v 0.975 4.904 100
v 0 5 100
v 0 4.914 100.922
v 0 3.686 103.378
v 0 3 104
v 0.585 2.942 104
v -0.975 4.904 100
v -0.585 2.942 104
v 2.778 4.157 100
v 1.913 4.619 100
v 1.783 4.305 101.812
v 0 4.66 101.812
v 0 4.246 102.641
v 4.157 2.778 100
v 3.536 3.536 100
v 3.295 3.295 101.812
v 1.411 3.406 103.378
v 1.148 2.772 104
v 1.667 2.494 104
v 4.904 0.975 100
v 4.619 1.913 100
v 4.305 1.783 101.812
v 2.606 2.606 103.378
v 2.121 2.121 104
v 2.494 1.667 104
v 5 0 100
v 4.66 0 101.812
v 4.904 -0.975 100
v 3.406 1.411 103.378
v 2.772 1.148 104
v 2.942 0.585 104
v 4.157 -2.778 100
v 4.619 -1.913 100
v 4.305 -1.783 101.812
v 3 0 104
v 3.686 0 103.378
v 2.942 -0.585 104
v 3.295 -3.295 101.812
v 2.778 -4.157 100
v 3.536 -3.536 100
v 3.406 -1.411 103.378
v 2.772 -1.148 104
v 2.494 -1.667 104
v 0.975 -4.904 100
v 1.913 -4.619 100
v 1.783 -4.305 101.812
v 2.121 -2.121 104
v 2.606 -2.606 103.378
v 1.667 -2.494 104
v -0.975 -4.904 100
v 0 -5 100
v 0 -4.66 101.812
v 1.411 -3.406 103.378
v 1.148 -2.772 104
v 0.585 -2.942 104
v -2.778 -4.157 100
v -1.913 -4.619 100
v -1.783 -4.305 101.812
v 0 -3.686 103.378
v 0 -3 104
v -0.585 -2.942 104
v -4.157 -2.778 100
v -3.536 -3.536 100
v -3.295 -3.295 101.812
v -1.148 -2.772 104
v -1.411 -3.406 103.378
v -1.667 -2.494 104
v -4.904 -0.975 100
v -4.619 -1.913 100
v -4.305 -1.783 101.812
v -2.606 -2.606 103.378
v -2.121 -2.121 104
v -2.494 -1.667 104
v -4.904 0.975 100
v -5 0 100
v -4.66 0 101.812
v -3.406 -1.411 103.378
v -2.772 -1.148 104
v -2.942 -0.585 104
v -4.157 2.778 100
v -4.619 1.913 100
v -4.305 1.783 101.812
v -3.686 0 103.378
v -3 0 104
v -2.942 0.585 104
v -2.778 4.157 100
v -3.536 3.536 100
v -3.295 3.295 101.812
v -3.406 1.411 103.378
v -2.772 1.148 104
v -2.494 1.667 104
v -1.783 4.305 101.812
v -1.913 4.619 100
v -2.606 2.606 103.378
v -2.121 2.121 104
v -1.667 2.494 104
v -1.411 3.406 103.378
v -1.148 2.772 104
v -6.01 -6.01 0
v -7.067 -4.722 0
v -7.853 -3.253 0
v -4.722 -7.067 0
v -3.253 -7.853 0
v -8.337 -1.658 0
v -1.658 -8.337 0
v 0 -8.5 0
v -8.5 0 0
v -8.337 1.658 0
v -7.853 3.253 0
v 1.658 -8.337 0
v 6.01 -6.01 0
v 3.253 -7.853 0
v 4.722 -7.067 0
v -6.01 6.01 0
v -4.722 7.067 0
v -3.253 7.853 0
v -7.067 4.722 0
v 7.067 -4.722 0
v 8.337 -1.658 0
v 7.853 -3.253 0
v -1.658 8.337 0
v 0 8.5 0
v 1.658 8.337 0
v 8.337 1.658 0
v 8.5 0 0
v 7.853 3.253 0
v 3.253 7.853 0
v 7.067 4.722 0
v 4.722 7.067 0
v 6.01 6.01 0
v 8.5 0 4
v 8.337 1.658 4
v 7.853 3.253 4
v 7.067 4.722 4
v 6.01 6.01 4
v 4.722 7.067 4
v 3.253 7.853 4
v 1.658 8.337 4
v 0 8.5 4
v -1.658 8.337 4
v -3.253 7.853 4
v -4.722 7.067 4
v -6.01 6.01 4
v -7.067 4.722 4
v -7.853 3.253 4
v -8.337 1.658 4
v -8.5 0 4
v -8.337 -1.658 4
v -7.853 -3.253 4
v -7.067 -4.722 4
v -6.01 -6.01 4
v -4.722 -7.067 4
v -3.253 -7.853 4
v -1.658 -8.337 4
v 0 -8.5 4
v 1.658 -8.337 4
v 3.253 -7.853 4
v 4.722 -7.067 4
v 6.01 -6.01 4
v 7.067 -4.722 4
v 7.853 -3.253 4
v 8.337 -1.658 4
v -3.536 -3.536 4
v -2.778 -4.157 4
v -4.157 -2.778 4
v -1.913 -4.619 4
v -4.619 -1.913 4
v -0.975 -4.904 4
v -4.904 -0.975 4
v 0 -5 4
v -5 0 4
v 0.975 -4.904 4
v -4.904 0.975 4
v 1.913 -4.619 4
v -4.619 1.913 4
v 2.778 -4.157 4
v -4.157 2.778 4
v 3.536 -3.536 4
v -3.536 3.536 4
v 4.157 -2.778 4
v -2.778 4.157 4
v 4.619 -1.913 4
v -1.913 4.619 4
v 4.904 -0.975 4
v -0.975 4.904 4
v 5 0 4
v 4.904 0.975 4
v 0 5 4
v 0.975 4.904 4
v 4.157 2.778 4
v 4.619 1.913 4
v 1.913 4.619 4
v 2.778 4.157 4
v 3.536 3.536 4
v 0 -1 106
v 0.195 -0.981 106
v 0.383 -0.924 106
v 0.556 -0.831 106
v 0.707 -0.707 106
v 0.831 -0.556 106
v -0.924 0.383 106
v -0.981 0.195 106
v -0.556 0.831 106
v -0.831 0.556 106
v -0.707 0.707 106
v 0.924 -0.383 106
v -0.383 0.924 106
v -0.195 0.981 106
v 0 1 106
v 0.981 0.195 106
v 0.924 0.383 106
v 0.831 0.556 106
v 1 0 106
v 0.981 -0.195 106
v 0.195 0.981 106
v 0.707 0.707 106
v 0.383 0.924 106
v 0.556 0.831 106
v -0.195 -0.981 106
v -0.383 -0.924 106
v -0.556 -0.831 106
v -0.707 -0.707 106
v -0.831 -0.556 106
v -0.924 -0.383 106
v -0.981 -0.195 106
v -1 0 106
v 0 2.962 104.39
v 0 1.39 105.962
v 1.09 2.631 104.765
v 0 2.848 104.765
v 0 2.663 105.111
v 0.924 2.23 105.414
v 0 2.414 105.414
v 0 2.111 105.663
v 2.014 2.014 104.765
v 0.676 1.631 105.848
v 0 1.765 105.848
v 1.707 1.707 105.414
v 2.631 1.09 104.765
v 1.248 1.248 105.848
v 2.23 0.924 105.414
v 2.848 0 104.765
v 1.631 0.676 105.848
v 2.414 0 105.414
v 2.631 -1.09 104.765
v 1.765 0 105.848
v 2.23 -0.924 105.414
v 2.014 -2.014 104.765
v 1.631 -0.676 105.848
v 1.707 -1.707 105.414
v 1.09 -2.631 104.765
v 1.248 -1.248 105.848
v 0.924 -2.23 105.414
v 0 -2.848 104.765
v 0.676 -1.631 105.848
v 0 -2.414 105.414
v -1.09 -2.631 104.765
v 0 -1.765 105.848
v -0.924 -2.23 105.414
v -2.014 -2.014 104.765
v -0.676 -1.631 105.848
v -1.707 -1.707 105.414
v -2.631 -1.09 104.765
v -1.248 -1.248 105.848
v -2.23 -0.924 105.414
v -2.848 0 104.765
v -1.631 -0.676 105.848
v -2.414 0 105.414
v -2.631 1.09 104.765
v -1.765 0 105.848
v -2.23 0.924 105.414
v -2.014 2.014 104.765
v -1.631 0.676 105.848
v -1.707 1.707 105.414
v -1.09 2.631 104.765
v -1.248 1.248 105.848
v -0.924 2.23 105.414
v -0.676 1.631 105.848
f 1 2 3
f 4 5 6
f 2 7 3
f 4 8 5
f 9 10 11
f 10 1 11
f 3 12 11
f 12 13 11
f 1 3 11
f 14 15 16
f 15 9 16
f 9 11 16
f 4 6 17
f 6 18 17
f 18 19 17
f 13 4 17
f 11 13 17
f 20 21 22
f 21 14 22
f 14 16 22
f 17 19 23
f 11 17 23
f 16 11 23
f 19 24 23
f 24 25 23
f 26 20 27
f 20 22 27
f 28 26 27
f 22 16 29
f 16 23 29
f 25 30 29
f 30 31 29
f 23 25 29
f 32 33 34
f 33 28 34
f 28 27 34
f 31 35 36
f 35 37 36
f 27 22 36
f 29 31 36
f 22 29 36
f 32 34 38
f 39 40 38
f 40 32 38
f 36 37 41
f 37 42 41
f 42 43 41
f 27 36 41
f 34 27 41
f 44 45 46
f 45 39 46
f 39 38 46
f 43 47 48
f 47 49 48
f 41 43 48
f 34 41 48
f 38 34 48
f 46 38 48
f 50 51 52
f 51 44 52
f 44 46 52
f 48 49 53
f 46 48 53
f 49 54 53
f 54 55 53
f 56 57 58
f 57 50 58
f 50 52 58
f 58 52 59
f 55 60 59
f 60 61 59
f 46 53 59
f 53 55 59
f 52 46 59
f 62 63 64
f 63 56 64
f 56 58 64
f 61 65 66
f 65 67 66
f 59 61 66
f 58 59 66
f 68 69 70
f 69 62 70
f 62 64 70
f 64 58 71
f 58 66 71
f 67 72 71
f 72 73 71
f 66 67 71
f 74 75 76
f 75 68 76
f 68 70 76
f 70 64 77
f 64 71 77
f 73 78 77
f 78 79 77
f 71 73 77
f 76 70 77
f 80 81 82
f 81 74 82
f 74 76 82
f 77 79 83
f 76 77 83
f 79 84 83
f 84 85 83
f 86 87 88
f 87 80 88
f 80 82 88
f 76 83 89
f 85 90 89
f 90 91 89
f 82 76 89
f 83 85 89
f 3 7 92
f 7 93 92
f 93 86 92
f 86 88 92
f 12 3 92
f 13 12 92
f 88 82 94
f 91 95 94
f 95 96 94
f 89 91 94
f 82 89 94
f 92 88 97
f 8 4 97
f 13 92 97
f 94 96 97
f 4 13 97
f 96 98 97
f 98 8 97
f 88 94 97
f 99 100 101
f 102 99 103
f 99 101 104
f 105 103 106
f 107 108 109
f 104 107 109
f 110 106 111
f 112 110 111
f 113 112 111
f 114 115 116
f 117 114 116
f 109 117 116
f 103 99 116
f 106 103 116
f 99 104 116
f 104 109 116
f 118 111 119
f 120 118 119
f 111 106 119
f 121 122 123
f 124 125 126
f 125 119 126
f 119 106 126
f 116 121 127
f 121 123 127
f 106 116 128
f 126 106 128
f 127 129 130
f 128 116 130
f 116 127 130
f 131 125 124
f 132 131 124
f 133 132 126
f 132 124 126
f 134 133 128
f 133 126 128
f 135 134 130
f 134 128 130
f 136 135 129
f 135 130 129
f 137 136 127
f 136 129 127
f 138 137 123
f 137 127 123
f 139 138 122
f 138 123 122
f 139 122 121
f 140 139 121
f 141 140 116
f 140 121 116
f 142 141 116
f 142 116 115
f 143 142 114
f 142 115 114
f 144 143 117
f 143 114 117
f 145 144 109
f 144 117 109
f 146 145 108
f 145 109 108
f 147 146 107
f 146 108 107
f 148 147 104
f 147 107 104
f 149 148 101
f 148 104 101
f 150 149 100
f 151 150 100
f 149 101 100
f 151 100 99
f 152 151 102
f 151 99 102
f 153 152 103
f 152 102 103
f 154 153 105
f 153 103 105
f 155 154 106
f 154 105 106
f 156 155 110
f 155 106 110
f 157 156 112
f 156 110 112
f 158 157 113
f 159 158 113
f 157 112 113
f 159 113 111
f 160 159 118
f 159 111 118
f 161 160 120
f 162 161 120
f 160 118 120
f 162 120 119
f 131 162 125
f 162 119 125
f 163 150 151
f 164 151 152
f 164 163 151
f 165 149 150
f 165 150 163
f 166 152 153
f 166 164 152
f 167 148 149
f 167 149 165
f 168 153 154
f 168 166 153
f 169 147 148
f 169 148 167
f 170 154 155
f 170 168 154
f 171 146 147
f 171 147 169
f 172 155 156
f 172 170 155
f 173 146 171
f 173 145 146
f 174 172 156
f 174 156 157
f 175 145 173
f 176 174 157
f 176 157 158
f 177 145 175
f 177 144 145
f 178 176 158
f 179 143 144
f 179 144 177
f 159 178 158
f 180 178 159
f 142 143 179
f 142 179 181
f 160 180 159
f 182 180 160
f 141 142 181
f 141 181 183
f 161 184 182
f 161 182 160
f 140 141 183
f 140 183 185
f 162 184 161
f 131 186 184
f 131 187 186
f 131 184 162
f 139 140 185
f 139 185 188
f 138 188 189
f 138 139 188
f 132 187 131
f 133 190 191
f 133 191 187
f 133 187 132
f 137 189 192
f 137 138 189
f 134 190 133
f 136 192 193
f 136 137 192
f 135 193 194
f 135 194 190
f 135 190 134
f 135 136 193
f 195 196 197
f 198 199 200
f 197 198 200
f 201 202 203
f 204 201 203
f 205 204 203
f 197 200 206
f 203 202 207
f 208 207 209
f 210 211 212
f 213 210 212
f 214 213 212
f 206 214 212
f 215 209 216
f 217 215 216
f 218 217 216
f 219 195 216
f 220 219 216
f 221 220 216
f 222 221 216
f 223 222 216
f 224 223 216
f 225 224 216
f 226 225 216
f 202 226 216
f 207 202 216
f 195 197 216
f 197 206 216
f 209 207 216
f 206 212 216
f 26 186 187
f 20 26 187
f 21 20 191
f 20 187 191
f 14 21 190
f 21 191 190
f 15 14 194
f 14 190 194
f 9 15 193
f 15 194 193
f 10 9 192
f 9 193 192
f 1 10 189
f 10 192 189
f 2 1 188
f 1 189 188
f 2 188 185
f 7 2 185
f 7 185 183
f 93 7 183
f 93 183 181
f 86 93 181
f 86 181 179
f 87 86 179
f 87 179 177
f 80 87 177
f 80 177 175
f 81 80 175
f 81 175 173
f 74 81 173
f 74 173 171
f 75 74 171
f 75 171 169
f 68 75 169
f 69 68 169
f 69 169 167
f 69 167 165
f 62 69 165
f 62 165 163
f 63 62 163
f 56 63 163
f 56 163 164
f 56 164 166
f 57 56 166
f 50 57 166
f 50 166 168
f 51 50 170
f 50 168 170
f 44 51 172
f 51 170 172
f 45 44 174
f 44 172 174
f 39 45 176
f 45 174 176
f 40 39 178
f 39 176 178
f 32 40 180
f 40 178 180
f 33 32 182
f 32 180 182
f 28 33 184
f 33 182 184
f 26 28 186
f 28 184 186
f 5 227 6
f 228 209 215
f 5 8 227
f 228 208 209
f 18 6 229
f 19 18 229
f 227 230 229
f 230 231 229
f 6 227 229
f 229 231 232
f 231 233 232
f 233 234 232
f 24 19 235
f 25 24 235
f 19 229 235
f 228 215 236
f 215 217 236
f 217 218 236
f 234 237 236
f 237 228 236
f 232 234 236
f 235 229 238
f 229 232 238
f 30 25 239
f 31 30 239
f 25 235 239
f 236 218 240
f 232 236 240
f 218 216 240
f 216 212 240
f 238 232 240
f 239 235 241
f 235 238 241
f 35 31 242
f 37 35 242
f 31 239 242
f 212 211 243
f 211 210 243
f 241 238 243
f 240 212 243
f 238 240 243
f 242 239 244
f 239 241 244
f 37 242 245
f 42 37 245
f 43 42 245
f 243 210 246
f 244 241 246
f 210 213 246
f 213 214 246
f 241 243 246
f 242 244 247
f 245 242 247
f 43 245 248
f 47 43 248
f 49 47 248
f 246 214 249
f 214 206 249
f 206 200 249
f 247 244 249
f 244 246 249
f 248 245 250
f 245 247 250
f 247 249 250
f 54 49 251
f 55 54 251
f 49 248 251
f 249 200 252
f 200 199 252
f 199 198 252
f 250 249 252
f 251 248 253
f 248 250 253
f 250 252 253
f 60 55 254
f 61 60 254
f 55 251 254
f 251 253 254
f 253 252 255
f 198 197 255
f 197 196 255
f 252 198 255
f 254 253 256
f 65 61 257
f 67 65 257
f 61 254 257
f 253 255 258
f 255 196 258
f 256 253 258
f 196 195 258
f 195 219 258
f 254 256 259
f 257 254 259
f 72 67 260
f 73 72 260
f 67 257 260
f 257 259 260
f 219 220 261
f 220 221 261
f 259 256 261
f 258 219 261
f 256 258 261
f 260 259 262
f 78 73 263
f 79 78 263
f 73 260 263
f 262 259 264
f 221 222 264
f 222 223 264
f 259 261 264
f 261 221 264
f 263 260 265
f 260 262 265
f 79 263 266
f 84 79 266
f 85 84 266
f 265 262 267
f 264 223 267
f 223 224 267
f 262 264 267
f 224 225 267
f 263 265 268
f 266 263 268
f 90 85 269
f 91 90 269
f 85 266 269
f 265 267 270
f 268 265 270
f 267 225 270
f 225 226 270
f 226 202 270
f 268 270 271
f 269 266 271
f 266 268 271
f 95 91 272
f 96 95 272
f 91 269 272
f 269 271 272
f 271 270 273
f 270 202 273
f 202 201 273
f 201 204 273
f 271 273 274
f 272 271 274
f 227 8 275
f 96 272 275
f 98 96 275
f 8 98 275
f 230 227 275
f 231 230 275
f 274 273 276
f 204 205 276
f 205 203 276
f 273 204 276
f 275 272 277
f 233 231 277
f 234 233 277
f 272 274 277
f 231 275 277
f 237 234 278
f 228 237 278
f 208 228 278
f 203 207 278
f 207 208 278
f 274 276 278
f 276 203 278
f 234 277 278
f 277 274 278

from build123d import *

# Parameters (mm, degrees)
F0_R     = 8.5
F1_DEPTH = 4
F2_R     = 5
F3_DEPTH = 100


with BuildPart() as f1:
    # F0 (on Top) → F1 (new body)
    with BuildSketch(Plane.XY):
        Circle(F0_R)
    extrude(amount=F1_DEPTH)

    # F2 (on Top) → F3 (join)
    with BuildSketch(Plane.XY):
        Circle(F2_R)
    extrude(amount=F3_DEPTH)

    # F4 (on Right) → F5 (revolve)
    with BuildSketch(Plane.YZ):
        with BuildLine():
            Line((0, 104), (0, 100))
            Line((0, 100), (5, 100))
            ThreePointArc((5, 100), (4.472136, 102.236068), (3, 104))
            Line((3, 104), (0, 104))
        make_face()
        with BuildLine():
            ThreePointArc((0, 105), (1.581139, 104.743416), (3, 104))
            ThreePointArc((3, 104), (2.414214, 105.414214), (1, 106))
            Line((1, 106), (0, 106))
            Line((0, 106), (0, 105))
        make_face()
        with BuildLine():
            Line((0, 105), (0, 104))
            Line((0, 104), (3, 104))
            ThreePointArc((3, 104), (1.581139, 104.743416), (0, 105))
        make_face()
    revolve(axis=Axis((0, 0, 103), (0, 0, -1)))


solid = f1.part
